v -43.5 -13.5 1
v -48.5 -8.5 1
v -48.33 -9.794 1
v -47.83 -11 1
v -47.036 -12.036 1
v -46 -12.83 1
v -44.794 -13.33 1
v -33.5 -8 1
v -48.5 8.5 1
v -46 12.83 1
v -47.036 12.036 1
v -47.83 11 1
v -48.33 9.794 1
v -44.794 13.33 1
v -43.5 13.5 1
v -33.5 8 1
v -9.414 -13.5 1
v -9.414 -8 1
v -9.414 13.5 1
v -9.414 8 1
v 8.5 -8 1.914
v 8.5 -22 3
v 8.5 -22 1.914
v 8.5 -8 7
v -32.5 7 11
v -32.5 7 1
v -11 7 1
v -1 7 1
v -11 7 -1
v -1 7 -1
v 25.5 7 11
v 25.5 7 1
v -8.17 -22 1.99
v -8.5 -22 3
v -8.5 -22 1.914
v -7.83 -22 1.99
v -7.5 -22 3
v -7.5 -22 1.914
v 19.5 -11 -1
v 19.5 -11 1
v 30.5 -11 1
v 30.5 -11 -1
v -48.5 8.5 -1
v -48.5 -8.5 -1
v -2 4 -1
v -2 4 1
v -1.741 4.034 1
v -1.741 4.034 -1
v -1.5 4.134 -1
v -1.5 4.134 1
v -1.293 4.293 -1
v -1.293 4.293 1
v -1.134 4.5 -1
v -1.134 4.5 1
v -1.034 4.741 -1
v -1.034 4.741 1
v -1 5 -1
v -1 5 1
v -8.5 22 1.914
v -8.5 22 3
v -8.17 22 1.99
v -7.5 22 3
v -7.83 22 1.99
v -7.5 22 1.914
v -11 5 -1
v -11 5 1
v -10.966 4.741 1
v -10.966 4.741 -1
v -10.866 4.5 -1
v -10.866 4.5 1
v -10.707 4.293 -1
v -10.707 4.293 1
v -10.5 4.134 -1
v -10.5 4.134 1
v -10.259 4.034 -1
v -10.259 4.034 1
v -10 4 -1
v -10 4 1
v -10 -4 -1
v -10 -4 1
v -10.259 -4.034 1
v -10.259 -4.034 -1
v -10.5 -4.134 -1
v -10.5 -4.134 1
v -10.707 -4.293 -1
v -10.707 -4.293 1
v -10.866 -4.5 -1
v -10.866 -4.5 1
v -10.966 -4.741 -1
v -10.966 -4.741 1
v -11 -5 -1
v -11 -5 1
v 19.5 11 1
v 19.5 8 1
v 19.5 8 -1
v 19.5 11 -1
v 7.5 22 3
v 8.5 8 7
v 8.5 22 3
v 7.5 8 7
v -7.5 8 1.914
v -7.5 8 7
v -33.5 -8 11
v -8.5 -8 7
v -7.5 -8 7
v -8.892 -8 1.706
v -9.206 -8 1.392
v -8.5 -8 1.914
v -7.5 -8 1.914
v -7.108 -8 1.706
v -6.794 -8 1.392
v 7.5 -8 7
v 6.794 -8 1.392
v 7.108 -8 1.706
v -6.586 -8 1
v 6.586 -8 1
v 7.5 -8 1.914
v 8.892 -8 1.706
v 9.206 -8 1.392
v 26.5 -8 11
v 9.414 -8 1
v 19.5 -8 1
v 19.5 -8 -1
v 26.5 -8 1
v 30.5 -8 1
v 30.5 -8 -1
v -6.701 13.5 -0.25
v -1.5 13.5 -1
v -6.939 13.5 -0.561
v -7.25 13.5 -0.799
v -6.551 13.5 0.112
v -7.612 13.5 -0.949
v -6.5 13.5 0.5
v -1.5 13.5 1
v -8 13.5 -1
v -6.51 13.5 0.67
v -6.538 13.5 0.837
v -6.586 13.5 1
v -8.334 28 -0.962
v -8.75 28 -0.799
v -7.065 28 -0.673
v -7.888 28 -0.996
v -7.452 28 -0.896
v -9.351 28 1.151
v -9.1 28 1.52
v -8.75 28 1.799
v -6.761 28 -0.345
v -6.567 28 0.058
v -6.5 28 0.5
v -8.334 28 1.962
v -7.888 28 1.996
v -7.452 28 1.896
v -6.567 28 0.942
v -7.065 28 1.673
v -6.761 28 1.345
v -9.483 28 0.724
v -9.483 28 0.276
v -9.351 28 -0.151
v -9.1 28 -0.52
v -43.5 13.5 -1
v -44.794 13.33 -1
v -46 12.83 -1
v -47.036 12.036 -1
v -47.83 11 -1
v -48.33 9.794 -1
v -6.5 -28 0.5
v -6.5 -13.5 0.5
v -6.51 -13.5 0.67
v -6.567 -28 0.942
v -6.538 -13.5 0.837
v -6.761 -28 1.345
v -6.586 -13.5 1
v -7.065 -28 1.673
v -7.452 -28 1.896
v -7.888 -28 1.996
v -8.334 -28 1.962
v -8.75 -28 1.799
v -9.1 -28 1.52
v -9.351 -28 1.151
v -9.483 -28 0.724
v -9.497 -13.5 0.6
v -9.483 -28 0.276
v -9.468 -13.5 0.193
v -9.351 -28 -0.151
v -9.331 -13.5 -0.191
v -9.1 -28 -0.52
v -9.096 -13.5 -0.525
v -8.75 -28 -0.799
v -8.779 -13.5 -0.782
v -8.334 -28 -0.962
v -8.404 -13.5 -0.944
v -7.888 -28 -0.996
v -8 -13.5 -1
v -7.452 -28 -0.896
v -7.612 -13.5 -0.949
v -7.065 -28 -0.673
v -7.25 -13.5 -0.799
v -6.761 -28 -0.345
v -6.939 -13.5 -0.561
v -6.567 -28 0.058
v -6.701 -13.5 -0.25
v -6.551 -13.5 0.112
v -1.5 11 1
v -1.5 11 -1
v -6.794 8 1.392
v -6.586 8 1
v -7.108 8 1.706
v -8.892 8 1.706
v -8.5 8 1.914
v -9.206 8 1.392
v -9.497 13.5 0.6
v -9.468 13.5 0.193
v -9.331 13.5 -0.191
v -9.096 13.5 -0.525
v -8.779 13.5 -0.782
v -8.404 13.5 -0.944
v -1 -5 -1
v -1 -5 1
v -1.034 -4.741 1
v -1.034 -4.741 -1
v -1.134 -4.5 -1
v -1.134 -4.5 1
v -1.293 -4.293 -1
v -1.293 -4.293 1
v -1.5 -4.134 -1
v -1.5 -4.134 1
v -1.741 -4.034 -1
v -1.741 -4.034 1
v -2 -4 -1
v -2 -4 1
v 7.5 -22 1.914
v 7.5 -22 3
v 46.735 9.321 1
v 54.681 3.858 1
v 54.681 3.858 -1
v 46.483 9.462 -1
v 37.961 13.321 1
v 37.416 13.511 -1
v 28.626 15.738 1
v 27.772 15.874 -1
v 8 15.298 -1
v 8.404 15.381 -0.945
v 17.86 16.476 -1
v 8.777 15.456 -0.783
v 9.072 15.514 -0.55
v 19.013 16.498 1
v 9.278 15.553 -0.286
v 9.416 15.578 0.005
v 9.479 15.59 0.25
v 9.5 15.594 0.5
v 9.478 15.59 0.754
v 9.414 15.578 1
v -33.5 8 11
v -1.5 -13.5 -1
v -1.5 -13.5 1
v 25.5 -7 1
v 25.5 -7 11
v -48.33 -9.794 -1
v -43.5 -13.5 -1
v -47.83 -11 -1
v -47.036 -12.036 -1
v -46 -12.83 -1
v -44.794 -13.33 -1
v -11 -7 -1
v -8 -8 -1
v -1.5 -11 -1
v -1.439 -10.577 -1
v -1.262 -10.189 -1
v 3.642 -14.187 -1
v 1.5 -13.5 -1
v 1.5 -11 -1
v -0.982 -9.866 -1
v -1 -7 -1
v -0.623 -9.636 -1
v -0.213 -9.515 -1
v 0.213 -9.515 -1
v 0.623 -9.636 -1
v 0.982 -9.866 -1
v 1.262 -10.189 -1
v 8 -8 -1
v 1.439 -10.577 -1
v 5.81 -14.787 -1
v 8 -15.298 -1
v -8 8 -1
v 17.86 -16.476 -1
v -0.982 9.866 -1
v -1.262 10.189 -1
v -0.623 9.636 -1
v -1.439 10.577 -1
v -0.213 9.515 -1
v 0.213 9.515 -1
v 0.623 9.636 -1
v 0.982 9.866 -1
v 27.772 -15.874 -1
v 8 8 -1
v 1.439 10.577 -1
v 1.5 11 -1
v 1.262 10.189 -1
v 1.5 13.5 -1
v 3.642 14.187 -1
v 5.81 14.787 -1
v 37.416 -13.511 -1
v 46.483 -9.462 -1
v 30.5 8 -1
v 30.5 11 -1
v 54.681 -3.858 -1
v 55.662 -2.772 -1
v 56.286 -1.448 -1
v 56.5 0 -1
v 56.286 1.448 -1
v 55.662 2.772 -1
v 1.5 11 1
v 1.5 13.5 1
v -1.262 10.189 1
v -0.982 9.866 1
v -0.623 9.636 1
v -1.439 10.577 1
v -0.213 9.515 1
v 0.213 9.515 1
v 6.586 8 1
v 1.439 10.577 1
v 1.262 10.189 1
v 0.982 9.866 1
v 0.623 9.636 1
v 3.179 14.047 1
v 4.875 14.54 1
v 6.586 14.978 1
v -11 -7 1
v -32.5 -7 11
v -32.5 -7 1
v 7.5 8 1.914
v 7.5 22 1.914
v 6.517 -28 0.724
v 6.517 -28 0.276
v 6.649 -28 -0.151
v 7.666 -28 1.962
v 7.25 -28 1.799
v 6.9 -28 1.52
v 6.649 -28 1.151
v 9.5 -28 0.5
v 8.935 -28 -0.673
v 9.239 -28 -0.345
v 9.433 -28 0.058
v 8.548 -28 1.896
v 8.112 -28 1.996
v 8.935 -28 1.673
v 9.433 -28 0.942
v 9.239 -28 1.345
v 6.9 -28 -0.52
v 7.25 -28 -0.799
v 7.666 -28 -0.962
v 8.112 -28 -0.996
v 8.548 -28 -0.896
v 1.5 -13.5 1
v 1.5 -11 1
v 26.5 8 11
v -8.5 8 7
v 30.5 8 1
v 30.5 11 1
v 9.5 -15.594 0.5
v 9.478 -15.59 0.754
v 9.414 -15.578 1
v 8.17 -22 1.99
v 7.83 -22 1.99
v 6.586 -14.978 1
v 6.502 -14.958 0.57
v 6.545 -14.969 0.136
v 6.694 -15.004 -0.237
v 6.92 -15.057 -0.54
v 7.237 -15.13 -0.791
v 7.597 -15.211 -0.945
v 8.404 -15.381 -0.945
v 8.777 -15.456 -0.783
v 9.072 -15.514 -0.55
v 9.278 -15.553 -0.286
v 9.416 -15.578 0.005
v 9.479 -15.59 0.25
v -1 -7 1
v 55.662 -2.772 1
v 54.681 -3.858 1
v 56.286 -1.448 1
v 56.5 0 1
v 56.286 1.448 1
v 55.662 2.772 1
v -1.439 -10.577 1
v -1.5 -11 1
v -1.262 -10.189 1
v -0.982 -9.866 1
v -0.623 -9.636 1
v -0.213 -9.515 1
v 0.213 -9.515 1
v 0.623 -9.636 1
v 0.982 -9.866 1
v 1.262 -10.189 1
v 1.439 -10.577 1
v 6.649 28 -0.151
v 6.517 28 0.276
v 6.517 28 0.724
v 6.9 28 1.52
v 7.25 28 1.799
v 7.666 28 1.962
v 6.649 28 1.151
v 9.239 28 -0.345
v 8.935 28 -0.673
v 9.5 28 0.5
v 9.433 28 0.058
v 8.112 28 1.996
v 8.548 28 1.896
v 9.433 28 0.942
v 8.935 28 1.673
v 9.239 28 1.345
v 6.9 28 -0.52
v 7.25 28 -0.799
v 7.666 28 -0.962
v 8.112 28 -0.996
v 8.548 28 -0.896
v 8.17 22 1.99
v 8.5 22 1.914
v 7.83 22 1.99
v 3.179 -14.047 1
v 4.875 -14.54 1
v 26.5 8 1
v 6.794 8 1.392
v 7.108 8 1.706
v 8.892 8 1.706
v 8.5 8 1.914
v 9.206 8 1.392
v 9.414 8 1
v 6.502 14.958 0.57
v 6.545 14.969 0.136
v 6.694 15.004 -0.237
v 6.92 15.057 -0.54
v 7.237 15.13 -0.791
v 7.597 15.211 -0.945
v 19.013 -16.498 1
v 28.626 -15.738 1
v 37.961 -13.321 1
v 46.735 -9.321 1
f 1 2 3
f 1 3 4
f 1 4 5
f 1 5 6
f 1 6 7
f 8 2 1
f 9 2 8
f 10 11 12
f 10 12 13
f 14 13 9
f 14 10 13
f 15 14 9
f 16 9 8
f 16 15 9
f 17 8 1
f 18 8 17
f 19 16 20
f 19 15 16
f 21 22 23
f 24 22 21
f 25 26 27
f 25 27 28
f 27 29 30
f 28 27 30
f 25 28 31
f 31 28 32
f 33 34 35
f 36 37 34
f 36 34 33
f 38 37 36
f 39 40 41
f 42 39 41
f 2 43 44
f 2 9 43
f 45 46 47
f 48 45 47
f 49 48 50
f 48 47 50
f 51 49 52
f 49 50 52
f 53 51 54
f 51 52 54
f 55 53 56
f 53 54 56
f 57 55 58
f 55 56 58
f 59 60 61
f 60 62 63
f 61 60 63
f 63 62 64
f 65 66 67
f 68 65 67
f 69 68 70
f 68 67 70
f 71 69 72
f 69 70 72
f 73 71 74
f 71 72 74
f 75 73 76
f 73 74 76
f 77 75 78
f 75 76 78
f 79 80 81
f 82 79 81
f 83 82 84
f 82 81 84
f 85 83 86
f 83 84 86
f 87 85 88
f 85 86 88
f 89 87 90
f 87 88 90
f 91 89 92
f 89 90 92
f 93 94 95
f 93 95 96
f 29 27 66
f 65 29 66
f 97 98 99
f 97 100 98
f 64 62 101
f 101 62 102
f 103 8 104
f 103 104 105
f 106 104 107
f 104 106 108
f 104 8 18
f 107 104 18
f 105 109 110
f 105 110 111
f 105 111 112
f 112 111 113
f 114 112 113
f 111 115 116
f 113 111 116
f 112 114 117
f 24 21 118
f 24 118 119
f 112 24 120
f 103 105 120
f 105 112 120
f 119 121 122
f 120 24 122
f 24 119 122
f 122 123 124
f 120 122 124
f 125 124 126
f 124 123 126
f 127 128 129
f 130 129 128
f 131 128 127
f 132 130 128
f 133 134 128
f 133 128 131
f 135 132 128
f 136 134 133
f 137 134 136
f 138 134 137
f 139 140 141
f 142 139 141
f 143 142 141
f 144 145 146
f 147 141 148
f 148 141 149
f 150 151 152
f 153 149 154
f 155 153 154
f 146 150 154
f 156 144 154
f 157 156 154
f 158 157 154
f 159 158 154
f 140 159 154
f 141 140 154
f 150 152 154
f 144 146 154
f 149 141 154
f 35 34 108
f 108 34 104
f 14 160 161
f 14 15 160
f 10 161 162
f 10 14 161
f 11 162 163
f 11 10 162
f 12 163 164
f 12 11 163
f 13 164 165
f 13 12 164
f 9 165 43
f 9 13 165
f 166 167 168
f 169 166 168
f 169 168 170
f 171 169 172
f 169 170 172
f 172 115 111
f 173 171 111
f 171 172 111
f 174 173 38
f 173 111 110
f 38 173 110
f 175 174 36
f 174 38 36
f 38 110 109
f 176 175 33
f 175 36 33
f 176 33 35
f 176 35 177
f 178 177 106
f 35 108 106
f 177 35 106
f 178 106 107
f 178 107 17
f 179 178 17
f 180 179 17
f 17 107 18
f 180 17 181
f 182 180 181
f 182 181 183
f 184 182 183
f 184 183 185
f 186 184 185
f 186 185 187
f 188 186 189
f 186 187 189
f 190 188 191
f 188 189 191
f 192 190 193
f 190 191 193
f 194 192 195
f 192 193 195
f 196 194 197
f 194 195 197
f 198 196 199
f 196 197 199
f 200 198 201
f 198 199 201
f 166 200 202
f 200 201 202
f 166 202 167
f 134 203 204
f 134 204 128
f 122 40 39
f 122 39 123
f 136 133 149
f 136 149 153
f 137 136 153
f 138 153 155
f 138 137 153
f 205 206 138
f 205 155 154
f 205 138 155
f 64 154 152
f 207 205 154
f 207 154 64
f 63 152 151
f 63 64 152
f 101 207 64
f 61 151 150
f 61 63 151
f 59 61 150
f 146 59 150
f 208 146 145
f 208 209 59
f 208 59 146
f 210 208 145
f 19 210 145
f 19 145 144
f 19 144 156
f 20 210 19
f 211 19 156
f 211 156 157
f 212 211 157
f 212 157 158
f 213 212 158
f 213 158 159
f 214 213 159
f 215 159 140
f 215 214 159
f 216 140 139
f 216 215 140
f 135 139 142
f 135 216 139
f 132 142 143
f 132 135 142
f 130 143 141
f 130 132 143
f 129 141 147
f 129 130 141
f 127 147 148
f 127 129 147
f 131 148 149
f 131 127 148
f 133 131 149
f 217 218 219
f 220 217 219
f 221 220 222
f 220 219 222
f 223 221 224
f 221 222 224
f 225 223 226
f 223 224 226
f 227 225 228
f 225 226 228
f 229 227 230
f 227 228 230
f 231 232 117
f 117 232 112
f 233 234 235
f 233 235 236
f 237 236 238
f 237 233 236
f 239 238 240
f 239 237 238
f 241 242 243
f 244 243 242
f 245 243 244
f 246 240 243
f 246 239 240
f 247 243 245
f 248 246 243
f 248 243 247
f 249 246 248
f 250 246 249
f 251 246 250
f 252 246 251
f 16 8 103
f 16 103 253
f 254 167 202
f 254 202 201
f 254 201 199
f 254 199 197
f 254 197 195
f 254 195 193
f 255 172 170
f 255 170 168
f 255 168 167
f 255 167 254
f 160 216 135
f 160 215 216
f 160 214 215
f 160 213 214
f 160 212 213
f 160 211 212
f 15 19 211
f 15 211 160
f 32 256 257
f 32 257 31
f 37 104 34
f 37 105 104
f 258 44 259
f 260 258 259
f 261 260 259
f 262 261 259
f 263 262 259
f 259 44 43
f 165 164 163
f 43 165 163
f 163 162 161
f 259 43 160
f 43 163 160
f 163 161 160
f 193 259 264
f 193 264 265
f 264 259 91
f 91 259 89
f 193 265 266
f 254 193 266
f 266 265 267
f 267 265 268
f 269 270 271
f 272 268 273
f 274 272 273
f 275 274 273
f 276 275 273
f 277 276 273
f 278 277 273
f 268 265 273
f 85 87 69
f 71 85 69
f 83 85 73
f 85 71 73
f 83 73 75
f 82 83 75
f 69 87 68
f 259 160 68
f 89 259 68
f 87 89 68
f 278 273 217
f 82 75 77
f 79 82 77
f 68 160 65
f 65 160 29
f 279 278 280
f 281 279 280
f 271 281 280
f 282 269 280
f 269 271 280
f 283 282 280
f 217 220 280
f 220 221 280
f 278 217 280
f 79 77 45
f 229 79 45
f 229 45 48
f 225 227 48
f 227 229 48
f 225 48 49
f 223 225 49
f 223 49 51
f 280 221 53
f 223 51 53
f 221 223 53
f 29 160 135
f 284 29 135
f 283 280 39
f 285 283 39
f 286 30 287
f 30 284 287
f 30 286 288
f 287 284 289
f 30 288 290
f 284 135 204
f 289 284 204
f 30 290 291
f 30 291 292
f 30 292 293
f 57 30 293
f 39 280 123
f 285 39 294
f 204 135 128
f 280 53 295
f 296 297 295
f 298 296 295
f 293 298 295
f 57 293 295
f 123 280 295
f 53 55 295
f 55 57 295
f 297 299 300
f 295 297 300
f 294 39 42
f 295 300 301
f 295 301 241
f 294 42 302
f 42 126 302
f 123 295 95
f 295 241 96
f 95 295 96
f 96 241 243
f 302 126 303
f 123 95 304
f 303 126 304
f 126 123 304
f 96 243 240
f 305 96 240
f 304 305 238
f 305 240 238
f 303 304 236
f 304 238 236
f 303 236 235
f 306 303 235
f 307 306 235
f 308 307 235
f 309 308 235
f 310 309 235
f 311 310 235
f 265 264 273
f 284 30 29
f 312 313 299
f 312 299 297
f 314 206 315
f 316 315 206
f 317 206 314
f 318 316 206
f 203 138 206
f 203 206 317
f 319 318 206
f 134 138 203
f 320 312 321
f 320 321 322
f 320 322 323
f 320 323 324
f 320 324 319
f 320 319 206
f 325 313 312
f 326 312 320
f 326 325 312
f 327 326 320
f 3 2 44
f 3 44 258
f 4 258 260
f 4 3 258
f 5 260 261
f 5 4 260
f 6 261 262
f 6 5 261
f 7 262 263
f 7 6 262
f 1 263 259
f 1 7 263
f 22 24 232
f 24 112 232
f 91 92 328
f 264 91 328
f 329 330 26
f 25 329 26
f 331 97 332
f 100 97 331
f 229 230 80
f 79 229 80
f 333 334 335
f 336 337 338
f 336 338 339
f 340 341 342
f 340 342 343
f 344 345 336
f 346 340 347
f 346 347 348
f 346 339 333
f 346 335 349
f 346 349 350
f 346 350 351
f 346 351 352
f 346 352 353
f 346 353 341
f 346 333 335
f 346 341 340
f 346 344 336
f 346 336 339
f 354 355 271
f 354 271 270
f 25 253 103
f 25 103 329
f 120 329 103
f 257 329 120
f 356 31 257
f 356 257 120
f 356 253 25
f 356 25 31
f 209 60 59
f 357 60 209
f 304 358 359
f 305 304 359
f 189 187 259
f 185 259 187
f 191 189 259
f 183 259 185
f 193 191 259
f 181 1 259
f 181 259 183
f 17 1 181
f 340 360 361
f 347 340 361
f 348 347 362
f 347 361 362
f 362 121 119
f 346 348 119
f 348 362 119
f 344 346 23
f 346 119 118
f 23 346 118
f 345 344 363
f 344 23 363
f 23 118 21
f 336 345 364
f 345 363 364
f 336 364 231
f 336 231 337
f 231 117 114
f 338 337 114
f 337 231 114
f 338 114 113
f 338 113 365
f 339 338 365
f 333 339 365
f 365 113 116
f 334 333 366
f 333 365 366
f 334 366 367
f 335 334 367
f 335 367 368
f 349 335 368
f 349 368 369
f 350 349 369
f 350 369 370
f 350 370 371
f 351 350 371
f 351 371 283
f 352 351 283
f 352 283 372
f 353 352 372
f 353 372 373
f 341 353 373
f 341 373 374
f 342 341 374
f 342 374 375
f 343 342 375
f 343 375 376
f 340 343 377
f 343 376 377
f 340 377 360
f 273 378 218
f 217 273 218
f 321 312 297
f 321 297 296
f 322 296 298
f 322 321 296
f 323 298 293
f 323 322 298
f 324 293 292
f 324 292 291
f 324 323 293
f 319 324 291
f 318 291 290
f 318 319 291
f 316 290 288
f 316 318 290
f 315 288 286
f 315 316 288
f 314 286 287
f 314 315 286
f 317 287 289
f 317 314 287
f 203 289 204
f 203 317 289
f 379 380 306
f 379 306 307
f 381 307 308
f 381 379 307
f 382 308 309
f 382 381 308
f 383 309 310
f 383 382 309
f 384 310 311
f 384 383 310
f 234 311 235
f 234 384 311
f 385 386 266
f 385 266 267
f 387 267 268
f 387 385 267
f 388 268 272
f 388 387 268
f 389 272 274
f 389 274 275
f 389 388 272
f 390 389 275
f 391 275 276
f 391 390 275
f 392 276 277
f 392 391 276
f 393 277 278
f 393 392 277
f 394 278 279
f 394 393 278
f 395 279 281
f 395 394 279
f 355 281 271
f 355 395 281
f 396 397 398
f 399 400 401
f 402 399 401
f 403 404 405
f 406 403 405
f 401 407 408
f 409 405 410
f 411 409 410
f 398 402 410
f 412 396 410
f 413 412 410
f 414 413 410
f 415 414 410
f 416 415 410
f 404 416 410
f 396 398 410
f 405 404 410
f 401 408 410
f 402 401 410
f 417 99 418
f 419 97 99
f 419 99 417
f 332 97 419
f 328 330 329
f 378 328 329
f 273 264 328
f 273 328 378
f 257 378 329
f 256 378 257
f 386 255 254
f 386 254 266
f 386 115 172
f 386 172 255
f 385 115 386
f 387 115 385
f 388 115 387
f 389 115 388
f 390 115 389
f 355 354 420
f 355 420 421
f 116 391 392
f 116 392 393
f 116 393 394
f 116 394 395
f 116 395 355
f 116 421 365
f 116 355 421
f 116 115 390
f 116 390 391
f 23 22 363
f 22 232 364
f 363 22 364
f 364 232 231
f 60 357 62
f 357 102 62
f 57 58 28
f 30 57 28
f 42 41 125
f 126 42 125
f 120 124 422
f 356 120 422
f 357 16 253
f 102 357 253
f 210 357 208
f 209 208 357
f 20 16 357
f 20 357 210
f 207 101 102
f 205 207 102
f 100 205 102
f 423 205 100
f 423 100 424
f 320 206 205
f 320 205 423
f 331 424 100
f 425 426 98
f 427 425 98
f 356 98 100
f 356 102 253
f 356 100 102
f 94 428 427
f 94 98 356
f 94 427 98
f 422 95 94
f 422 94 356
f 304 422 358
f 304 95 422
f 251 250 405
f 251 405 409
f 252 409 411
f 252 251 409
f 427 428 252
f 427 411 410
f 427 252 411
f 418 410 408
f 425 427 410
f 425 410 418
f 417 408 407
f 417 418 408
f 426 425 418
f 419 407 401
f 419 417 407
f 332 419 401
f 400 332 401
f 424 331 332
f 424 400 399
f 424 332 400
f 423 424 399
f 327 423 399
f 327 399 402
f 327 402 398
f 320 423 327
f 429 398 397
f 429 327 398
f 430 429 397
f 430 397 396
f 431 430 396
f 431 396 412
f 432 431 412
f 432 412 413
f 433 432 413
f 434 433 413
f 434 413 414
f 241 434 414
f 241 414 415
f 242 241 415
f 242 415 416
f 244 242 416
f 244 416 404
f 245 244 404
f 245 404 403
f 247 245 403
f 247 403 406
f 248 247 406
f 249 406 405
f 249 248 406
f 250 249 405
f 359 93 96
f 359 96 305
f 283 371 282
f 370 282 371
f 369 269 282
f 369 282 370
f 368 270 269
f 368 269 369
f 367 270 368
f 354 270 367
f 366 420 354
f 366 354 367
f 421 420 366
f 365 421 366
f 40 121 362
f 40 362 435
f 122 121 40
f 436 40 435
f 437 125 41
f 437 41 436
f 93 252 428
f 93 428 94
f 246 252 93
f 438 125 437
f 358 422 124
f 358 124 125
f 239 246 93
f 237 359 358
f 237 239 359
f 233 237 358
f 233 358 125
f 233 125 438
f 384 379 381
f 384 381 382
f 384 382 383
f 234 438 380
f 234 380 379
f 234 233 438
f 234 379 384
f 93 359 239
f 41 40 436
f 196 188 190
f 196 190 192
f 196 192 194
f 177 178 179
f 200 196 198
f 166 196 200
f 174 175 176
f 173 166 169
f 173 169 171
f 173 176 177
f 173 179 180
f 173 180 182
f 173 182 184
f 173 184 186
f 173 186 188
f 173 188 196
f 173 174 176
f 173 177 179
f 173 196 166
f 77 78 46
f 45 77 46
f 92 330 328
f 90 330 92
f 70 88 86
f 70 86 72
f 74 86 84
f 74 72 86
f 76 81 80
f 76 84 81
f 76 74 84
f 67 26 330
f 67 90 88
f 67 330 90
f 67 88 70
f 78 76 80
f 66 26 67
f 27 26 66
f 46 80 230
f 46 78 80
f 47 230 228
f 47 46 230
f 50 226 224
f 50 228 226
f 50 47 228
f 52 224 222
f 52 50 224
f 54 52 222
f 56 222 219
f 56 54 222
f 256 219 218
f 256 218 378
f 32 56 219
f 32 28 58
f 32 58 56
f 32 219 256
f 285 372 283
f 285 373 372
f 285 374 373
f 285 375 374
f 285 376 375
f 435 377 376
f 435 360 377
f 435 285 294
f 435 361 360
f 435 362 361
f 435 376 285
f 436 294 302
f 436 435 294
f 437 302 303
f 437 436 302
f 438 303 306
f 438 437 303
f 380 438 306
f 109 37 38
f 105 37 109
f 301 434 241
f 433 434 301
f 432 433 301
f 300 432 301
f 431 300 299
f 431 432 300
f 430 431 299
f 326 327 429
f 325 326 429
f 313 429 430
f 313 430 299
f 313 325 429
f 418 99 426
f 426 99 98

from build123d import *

# Parameters (mm, degrees)
F1_DEPTH  = 1
F2_W      = 60
F2_H      = 16
F2_W_2    = 58
F2_H_2    = 14
F3_DEPTH  = 10
F4_R      = 1.5
F5_DEPTH  = 20
F8_DEPTH  = 0.5
F11_W     = 11
F11_H     = 3
F12_DEPTH = 2.0010001


with BuildPart() as f1:
    # F0 (on Top) → F1 (new body, symmetric)
    with BuildSketch(Plane.XY):
        with BuildLine():
            Line((-48.5, 8.5), (-48.5, 0))
            Line((-48.5, 0), (-48.5, -8.5))
            ThreePointArc((-48.5, -8.5), (-47.0355339059, -12.0355339059), (-43.5, -13.5))
            Line((-43.5, -13.5), (-1.5, -13.5))
            Line((-1.5, -13.5), (-1.5, -11))
            ThreePointArc((-1.5, -11), (0, -9.5), (1.5, -11))
            Line((1.5, -11), (1.5, -13.5))
            ThreePointArc((1.5, -13.5), (29.3474128971, -15.612168306), (54.6807093507, -3.8578605504))
            ThreePointArc((54.6807093507, -3.8578605504), (56.5, 0), (54.6807093507, 3.8578605504))
            ThreePointArc((54.6807093507, 3.8578605504), (29.3474128971, 15.612168306), (1.5, 13.5))
            Line((1.5, 13.5), (1.5, 11))
            ThreePointArc((1.5, 11), (0, 9.5), (-1.5, 11))
            Line((-1.5, 11), (-1.5, 13.5))
            Line((-1.5, 13.5), (-43.5, 13.5))
            ThreePointArc((-43.5, 13.5), (-47.0355339059, 12.0355339059), (-48.5, 8.5))
        make_face()
    extrude(amount=F1_DEPTH, both=True)

    # F2 (on face) → F3 (join)
    with BuildSketch(Plane.XY.offset(1)):
        with Locations((-3.5, 0)):
            Rectangle(F2_W, F2_H)
        with Locations((-3.5, 0)):
            Rectangle(F2_W_2, F2_H_2, mode=Mode.SUBTRACT)
    extrude(amount=F3_DEPTH)

    # F4 (on face) → F5 (join)
    with BuildSketch(Plane.XZ.offset(8)):
        with Locations((-8, 0.5)):
            Circle(F4_R)
        with Locations((8, 0.5)):
            Circle(F4_R)
    extrude(amount=F5_DEPTH)



with BuildPart() as f8:
    # F7 (on offset) → F8 (new body, symmetric)
    with BuildSketch(Plane.YZ.offset(-8)):
        Polygon((-8, 7), (-22, 3), (-22, 0), (-8, 0), align=None)
    extrude(amount=F8_DEPTH, both=True)


with BuildPart() as f1_1:
    add(f1.part)

    add(f8.part)  # F9 merges F8
    # F9: F8 across plane
    add(f8.part.mirror(Plane.YZ))

    # F10: F1 across plane


with BuildPart() as f1_2:
    add(f1_1.part)
    add(f1_1.part.mirror(Plane.XZ))

    # F11 (on face) → F12 (cut, through all)
    with BuildSketch(Plane.XY.offset(1)):
        with Locations((25, 9.5)):
            Rectangle(F11_W, F11_H)
        with BuildLine():
            ThreePointArc((-11, 5), (-10.7071067812, 4.2928932188), (-10, 4))
            Line((-10, 4), (-2, 4))
            ThreePointArc((-2, 4), (-1.2928932188, 4.2928932188), (-1, 5))
            Line((-1, 5), (-1, 7))
            Line((-1, 7), (-11, 7))
            Line((-11, 7), (-11, 5))
        make_face()
        with BuildLine():
            ThreePointArc((-10, -4), (-10.7071067812, -4.2928932188), (-11, -5))
            Line((-11, -5), (-11, -7))
            Line((-11, -7), (-1, -7))
            Line((-1, -7), (-1, -5))
            ThreePointArc((-1, -5), (-1.2928932188, -4.2928932188), (-2, -4))
            Line((-2, -4), (-10, -4))
        make_face()
        with Locations((25, -9.5)):
            Rectangle(F11_W, F11_H)
    extrude(amount=-F12_DEPTH, mode=Mode.SUBTRACT)


solid = f1_2.part
